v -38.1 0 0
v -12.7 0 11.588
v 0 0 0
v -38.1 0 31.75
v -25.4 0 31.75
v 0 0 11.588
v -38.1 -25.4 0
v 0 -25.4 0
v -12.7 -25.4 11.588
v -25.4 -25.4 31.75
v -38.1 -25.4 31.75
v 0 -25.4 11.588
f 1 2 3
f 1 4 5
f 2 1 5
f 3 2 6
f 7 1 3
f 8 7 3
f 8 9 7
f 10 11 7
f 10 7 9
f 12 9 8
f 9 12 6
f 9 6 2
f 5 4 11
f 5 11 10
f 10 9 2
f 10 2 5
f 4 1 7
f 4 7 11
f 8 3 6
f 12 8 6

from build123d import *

# Parameters (mm, degrees)
F0_W     = 38.1
F0_H     = 31.75
F1_DEPTH = 25.4
F3_DEPTH = 25.401


with BuildPart() as f1:
    # F0 (on Front) → F1 (new body)
    with BuildSketch(Plane.XZ):
        with Locations((-19.05, 15.875)):
            Rectangle(F0_W, F0_H)
    extrude(amount=F1_DEPTH)

    # F2 (on face) → F3 (cut, through all)
    with BuildSketch(Plane(origin=(0, 0, 0), x_dir=(-1, 0, 0), z_dir=(0, 1, 0))):
        Polygon((0, 31.75), (0, 11.58768), (12.7, 11.58768), (25.4, 31.75), align=None)
    extrude(amount=-F3_DEPTH, mode=Mode.SUBTRACT)


solid = f1.part
